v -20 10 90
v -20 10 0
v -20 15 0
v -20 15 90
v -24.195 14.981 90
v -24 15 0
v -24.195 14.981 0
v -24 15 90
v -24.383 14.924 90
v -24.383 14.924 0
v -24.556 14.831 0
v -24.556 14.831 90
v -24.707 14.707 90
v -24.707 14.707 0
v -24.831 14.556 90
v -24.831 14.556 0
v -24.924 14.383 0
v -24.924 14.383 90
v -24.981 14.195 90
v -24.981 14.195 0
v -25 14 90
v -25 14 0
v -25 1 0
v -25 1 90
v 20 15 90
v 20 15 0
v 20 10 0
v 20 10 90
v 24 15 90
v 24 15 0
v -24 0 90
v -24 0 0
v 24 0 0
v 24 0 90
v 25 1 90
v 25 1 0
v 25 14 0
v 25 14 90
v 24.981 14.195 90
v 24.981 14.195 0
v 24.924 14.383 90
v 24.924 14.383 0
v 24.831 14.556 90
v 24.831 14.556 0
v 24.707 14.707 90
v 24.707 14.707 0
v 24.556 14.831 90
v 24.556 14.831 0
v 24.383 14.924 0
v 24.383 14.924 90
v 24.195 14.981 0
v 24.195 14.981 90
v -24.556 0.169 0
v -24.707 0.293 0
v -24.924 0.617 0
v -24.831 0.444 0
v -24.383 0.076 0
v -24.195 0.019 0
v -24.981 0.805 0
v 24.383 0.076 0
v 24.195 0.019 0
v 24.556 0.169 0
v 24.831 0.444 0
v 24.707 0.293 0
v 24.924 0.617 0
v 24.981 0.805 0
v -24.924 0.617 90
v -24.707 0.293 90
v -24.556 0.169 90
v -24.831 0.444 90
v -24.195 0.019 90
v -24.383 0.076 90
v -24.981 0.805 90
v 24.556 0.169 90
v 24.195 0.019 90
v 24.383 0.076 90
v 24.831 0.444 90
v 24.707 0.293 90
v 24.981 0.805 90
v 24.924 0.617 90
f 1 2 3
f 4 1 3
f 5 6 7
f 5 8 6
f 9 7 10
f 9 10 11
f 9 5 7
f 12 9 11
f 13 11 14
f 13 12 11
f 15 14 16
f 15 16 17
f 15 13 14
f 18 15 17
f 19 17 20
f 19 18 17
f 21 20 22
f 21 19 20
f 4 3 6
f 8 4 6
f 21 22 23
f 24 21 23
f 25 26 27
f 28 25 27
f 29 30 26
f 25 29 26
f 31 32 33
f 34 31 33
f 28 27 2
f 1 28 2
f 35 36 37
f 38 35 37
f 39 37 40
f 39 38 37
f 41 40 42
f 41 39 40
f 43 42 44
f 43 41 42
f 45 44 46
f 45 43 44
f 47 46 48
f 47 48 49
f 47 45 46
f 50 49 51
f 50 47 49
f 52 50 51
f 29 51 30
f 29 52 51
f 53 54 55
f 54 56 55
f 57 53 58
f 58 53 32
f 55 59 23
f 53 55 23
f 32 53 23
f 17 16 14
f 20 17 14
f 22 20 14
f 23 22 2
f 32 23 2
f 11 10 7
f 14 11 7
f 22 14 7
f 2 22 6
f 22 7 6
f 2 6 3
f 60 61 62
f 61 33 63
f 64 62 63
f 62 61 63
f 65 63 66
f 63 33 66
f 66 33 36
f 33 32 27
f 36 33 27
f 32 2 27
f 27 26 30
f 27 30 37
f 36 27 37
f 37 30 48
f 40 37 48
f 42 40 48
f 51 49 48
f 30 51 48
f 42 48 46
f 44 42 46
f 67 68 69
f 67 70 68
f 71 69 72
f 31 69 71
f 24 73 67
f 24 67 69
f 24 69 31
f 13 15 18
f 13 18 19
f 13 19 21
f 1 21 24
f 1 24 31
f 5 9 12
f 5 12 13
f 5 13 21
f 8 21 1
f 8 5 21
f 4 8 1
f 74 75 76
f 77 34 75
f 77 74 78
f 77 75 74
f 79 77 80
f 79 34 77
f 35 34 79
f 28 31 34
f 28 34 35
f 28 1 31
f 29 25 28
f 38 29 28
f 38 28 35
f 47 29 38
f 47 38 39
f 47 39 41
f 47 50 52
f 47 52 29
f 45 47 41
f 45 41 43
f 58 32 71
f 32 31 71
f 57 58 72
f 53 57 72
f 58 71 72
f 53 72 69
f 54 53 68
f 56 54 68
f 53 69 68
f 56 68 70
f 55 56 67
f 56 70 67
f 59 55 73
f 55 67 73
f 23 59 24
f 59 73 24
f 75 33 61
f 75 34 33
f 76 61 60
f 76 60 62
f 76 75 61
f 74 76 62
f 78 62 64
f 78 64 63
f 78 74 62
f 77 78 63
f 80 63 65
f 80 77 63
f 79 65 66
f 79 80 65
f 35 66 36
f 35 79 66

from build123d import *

# Parameters (mm, degrees)
BOSS_EXTRUDE1_DEPTH = 90
FILLET1_R           = 1


with BuildPart() as part:
    # Sketch1 → Boss-Extrude1 (new body)
    with BuildSketch(Plane.XY):
        Polygon((-25, 0), (25, 0), (25, 15), (20, 15), (20, 10), (-20, 10), (-20, 15), (-25, 15), align=None)
    extrude(amount=BOSS_EXTRUDE1_DEPTH)

    # Fillet1
    fillet1_edges = [part.edges().sort_by_distance(p)[0] for p in [
        (-25, 15, 45),
        (25, 15, 45),
        (25, 0, 45),
        (-25, 0, 45),
    ]]
    fillet(fillet1_edges, radius=FILLET1_R)


solid = part.part
